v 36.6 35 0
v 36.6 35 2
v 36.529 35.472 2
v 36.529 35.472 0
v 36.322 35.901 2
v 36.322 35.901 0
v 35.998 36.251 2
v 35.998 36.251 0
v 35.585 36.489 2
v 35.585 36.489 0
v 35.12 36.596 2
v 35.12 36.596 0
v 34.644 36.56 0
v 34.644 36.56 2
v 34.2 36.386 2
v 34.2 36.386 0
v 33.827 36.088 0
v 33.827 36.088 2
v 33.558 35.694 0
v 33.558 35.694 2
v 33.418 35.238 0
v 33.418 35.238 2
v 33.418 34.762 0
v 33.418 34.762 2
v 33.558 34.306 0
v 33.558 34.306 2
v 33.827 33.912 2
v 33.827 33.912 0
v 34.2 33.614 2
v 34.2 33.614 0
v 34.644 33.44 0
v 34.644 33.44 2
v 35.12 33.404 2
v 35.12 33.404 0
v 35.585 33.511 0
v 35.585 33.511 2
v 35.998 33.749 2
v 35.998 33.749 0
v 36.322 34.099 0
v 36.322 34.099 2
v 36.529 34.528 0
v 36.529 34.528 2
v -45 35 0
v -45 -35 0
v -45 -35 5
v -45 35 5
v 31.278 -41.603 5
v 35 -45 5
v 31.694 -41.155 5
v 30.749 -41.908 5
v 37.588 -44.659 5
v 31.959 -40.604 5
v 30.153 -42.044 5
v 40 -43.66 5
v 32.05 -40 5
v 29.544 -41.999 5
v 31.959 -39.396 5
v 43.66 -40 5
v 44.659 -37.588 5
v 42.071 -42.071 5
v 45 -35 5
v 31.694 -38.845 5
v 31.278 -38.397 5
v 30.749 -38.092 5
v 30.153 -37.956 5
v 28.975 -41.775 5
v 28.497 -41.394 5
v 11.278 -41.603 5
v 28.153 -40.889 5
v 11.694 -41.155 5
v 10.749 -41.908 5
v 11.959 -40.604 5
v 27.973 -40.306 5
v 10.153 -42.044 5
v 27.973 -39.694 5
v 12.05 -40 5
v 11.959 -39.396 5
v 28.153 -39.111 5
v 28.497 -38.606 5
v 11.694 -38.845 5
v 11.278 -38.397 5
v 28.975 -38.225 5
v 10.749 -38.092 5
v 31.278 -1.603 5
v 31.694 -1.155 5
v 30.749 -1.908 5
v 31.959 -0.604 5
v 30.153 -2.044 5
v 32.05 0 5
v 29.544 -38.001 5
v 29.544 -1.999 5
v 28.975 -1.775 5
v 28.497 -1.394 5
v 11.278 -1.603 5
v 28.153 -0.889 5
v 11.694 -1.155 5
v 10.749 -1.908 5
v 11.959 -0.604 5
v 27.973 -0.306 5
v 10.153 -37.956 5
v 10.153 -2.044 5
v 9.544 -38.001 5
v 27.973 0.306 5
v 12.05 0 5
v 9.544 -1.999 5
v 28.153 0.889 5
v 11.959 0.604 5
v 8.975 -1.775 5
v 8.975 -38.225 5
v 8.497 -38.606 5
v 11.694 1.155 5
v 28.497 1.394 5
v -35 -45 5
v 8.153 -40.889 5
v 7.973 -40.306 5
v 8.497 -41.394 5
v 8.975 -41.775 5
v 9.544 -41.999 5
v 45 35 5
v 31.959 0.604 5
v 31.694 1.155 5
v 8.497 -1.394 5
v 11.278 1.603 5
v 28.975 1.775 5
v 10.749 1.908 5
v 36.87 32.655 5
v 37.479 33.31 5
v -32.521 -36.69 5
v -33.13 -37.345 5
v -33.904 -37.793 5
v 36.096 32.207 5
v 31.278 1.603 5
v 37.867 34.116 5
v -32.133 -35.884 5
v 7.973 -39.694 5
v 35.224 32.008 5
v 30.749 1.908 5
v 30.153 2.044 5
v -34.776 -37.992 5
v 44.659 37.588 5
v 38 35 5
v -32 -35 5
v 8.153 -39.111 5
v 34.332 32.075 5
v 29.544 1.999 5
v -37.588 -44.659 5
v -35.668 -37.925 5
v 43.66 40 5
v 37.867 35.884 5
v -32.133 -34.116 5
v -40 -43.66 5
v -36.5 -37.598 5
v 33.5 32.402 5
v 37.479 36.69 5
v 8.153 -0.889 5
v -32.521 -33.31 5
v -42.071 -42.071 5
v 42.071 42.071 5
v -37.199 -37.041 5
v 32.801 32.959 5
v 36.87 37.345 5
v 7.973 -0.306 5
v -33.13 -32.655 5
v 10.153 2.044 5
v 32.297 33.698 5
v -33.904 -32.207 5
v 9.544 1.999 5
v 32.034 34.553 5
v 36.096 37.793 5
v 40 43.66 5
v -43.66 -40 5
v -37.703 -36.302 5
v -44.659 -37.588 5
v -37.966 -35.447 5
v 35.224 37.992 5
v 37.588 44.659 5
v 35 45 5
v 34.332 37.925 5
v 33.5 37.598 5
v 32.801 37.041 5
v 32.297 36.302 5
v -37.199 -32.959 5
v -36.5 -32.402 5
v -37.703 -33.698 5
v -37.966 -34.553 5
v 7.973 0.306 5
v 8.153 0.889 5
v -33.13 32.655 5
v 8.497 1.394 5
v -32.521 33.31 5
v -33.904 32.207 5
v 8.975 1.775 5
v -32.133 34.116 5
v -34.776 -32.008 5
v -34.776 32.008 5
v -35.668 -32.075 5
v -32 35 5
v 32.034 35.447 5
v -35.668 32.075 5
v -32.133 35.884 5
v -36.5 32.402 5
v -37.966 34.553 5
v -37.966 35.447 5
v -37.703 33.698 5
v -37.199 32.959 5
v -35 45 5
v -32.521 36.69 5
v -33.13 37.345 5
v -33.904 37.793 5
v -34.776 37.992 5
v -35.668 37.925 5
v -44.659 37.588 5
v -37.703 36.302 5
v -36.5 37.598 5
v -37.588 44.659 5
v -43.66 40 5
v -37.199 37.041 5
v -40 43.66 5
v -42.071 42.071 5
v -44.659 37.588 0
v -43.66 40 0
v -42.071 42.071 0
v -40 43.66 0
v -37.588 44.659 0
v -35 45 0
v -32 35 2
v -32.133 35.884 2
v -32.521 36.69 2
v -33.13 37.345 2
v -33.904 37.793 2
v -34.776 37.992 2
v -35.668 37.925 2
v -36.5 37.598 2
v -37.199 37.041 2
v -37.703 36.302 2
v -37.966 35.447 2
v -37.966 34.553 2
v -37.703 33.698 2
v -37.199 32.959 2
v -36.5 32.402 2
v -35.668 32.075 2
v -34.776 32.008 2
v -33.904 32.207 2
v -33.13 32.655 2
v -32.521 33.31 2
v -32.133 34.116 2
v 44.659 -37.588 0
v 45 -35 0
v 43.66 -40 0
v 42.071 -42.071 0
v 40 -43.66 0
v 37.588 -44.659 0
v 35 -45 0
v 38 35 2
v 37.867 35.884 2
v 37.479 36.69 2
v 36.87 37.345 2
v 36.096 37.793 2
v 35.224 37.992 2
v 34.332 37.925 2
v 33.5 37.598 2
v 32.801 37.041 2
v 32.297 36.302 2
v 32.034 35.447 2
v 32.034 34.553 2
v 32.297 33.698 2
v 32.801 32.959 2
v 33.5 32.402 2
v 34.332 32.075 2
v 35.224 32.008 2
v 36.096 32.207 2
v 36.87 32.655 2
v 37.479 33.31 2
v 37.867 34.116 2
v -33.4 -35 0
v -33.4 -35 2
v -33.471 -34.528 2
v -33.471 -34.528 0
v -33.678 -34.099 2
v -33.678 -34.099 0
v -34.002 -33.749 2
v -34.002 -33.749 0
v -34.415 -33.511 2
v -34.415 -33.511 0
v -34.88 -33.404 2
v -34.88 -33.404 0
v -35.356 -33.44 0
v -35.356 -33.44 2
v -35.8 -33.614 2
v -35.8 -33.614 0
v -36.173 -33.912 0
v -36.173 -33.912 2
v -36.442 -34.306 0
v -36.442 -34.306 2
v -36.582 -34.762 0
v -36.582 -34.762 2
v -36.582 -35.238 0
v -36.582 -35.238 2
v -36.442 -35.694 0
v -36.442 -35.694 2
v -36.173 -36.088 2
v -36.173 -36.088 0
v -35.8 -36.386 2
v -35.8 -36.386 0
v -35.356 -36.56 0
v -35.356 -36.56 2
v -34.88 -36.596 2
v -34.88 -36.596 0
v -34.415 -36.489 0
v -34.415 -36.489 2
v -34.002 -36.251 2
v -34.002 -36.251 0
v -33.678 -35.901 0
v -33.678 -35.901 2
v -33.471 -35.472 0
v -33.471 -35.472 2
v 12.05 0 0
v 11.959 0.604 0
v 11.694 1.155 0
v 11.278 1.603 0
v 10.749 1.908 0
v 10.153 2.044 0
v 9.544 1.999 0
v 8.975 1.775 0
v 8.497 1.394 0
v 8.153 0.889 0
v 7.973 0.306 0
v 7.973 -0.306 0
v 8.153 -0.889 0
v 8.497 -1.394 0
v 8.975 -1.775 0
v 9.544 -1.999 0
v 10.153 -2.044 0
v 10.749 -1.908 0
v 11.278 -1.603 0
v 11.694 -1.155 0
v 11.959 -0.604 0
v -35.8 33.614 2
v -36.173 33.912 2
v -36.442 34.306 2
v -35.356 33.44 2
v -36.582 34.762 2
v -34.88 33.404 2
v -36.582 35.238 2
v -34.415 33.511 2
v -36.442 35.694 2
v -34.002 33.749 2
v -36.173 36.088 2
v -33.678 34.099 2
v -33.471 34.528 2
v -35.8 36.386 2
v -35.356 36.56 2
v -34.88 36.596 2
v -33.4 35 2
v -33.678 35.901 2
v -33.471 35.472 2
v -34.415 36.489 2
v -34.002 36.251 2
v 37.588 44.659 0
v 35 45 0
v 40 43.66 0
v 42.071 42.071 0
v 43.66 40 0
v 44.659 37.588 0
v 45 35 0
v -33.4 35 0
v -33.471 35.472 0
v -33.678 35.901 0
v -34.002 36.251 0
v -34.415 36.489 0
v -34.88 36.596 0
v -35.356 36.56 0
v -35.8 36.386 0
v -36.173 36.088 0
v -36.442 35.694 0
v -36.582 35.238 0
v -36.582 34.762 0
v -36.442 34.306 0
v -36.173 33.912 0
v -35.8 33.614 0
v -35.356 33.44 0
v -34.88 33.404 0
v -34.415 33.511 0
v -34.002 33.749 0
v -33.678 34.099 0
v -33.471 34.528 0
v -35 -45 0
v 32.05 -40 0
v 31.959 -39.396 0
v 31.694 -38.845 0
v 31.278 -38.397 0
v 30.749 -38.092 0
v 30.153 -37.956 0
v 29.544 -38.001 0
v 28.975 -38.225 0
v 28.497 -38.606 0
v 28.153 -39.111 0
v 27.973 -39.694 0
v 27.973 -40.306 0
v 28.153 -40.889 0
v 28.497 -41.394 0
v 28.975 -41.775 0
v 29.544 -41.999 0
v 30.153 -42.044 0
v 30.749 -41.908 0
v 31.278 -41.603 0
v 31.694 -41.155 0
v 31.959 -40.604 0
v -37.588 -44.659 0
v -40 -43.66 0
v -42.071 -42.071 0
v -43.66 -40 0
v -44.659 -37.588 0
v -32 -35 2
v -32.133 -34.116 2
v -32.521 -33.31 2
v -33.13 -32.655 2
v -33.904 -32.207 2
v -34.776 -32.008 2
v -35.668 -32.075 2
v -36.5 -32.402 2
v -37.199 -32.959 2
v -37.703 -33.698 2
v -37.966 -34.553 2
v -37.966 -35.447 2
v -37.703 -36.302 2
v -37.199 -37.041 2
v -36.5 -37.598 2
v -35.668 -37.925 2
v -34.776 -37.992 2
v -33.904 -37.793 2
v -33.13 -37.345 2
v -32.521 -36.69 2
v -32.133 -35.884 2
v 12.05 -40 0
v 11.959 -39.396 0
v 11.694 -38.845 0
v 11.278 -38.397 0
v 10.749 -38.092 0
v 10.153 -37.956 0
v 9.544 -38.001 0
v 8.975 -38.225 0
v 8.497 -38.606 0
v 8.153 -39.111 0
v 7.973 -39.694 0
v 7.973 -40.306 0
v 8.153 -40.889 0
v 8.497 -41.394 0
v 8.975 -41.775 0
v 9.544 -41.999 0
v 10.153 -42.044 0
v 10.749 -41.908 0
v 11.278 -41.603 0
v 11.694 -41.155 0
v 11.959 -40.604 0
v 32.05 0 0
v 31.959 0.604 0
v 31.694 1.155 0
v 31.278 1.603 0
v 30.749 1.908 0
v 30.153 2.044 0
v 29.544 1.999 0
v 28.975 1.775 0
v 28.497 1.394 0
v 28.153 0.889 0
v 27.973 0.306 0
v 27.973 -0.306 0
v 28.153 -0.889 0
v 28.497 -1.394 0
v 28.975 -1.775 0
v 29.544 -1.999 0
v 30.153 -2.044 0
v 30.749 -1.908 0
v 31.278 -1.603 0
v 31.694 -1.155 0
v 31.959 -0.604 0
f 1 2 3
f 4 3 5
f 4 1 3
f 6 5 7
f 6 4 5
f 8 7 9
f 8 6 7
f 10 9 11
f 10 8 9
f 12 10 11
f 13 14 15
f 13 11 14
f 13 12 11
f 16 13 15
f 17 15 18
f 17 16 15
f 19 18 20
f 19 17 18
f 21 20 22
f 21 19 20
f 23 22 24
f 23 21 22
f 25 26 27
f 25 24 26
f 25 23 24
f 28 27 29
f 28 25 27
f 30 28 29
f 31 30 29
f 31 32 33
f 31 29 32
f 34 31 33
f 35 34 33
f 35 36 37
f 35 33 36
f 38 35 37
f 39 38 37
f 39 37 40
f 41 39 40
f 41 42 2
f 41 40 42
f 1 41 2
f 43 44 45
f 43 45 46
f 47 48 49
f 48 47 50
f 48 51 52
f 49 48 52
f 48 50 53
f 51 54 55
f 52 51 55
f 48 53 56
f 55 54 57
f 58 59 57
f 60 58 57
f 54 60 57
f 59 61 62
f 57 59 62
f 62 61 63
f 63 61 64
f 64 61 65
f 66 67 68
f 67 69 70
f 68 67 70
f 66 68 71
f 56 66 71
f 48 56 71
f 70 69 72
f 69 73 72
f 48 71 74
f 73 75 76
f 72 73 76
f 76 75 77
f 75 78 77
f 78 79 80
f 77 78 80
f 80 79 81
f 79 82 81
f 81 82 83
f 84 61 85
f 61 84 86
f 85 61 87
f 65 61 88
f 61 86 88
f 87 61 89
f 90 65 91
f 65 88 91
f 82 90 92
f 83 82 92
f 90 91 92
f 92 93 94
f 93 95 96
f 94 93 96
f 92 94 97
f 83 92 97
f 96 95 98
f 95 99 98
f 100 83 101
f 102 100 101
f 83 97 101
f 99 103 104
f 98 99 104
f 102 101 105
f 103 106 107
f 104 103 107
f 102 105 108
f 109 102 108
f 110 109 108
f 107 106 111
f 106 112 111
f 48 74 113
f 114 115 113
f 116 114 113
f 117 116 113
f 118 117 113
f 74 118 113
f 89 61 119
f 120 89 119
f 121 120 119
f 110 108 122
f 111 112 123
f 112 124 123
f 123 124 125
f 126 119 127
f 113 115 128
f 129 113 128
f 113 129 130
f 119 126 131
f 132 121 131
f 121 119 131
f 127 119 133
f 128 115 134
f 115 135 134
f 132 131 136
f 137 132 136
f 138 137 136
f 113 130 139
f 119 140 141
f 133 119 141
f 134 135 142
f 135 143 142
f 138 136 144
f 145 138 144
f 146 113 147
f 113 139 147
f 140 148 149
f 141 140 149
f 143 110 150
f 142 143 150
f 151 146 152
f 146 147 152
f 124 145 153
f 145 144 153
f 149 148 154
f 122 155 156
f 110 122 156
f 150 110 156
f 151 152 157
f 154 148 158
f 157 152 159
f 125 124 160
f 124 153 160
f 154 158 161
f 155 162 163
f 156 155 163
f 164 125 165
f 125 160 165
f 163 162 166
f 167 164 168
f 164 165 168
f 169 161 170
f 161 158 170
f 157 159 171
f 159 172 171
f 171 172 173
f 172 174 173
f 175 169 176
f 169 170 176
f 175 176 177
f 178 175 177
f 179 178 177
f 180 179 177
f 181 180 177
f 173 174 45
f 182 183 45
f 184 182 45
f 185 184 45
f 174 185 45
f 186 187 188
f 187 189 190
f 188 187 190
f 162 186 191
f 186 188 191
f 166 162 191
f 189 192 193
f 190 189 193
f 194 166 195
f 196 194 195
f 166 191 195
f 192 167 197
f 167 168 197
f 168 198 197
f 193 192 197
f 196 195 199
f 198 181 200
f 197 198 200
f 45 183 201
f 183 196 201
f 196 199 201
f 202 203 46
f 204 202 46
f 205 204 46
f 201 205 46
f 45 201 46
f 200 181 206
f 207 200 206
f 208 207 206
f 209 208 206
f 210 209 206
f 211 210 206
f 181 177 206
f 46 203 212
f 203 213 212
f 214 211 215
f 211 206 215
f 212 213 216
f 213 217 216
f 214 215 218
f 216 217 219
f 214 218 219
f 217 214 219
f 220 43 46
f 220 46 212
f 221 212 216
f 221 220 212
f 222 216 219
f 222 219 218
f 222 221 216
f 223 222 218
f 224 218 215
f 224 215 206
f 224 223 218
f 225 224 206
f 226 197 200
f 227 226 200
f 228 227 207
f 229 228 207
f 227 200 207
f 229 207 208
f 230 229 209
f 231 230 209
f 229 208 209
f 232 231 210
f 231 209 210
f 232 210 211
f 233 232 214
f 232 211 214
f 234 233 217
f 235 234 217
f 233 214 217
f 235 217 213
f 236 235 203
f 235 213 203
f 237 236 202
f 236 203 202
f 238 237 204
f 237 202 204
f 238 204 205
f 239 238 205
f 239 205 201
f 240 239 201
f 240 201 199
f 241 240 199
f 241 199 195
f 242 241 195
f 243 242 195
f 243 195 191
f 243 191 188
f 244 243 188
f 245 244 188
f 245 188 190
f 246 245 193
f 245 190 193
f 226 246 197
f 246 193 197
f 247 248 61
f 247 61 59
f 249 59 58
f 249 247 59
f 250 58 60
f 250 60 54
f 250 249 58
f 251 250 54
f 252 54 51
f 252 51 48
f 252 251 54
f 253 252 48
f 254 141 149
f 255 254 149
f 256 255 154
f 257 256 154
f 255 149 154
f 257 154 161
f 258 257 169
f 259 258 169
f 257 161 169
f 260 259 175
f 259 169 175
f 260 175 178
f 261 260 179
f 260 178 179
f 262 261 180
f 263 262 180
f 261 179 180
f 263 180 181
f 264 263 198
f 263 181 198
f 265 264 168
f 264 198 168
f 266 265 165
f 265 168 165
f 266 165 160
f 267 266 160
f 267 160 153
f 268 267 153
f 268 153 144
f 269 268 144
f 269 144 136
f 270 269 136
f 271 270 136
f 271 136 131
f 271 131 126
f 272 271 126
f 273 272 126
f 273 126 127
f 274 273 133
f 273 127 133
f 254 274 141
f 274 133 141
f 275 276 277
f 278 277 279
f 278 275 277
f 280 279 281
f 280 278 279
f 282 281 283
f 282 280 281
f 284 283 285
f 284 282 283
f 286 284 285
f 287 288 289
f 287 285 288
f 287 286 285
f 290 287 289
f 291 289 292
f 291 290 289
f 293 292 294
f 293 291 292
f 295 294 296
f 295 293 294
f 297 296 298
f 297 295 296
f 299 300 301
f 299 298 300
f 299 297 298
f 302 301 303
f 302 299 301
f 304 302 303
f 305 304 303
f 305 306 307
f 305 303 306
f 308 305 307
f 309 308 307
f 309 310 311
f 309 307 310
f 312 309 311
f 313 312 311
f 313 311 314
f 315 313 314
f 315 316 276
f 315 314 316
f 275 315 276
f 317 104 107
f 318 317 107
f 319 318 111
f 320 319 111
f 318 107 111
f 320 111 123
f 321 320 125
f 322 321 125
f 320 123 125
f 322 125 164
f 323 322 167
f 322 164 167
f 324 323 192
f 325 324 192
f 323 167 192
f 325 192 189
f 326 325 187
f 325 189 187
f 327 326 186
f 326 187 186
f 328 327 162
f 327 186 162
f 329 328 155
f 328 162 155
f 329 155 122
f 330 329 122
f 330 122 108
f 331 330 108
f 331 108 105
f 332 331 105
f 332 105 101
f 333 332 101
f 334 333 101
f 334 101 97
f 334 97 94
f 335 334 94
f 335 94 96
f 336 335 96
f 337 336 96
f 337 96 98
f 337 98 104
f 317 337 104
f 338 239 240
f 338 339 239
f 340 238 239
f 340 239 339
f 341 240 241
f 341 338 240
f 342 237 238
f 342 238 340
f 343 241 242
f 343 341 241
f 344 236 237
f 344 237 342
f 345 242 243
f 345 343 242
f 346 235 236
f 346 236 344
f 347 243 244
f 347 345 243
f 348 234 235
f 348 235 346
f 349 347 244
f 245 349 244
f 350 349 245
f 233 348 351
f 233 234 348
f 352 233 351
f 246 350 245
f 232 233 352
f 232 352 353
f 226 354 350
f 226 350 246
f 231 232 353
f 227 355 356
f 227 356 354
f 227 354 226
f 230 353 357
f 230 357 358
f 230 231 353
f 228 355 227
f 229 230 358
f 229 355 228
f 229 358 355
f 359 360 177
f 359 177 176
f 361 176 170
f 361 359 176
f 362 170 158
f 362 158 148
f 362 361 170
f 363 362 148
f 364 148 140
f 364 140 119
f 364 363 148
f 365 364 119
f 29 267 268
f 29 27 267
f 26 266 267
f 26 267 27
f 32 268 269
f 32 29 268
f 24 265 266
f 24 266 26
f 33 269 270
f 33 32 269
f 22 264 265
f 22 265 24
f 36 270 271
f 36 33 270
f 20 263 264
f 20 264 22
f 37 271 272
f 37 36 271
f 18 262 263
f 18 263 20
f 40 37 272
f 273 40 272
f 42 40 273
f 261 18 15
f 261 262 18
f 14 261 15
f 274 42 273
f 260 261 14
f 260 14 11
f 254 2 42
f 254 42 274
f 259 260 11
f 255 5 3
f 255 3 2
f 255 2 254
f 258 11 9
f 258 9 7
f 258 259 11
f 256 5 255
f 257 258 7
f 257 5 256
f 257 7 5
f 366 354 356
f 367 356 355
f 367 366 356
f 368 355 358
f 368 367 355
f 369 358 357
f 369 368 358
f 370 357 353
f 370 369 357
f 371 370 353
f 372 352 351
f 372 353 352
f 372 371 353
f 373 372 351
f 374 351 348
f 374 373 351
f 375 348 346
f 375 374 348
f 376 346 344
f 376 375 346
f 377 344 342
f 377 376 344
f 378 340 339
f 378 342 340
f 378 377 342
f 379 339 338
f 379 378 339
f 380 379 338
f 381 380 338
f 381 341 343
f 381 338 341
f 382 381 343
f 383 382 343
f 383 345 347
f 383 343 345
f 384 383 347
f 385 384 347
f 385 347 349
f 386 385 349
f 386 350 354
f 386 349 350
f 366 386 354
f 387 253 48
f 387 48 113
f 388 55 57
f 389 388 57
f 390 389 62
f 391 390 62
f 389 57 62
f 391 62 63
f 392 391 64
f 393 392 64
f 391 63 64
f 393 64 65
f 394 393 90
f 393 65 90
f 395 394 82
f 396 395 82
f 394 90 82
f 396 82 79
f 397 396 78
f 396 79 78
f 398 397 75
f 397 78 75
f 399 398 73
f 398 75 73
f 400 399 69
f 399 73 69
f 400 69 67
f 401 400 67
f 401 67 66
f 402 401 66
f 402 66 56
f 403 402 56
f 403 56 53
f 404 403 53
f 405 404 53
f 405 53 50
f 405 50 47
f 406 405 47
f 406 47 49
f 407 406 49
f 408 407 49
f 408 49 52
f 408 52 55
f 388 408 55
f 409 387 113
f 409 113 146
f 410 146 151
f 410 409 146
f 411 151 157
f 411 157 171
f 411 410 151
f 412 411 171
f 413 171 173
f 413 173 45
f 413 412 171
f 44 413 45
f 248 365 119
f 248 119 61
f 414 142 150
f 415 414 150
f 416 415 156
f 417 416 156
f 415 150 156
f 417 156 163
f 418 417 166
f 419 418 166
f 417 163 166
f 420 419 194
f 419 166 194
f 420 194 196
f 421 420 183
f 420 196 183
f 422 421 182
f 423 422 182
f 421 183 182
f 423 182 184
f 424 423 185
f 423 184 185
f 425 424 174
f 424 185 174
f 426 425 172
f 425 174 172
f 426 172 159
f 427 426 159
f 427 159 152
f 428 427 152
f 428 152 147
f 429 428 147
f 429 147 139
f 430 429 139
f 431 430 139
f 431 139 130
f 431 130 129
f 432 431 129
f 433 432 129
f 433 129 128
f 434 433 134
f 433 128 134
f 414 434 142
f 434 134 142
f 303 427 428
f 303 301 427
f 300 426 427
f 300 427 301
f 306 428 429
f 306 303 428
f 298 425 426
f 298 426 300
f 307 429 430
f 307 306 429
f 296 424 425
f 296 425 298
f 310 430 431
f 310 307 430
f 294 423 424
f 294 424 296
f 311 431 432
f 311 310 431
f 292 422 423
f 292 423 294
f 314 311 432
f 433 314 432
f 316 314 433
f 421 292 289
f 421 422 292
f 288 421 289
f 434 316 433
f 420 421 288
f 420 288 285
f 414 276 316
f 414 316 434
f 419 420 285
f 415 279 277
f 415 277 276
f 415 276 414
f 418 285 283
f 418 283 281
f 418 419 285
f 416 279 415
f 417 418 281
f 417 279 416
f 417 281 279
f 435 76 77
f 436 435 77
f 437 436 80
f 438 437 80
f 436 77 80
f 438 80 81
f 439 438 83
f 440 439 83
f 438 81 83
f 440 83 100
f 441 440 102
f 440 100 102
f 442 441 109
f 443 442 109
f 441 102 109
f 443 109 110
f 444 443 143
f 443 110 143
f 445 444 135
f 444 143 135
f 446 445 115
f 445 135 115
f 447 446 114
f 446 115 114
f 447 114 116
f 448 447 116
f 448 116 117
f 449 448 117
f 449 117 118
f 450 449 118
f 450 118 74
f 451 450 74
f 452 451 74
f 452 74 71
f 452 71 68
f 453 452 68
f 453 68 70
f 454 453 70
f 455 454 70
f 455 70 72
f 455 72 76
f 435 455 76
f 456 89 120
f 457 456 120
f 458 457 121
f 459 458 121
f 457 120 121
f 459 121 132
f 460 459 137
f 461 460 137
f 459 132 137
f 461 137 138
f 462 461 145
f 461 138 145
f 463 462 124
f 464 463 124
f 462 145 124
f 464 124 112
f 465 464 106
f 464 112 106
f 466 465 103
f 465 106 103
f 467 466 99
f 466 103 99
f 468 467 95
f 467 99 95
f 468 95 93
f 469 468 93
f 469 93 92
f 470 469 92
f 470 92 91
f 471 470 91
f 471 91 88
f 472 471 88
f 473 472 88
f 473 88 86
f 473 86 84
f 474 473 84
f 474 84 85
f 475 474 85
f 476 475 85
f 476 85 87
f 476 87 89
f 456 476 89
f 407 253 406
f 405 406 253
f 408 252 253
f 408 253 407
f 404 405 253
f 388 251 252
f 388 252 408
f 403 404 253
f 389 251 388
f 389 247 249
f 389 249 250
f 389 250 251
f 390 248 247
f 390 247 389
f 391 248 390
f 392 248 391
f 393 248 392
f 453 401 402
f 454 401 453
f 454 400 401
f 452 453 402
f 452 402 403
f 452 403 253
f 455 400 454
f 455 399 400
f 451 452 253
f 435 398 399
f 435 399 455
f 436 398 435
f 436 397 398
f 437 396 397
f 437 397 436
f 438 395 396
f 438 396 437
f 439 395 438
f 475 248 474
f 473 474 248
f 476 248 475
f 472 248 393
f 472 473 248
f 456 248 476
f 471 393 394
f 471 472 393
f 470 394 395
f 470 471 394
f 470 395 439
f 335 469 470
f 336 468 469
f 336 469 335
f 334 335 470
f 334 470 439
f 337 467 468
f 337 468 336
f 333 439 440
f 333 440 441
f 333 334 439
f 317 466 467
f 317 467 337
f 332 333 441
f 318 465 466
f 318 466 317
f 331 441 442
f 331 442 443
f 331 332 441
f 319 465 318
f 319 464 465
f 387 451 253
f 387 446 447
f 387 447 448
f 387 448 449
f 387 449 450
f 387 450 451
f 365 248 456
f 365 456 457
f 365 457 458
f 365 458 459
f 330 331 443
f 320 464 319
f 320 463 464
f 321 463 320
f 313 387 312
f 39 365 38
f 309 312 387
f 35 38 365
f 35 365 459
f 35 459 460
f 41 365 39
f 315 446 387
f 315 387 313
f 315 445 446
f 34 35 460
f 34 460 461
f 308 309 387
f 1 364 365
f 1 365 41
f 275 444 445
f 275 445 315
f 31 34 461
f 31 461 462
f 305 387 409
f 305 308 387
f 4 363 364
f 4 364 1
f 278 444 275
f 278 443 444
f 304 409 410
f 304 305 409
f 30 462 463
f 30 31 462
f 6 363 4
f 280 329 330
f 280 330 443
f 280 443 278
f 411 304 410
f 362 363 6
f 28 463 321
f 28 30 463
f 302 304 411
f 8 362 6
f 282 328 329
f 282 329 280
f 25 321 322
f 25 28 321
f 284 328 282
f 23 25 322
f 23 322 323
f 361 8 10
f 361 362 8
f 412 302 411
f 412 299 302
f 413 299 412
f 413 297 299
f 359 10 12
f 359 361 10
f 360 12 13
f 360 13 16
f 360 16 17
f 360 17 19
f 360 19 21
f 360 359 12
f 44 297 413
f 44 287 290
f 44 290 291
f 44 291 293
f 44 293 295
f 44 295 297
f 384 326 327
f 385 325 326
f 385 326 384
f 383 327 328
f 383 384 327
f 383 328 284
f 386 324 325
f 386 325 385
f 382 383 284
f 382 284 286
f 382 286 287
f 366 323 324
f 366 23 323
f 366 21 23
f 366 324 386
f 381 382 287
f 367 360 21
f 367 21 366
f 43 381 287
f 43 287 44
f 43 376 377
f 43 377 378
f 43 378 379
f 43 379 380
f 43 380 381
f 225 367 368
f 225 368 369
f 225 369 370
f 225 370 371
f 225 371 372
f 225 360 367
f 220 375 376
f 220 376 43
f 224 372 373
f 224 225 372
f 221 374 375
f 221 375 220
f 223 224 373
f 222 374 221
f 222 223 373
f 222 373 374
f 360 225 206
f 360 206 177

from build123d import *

# Parameters (mm, degrees)
SKETCH_1_R          = 1.6
EXTRUDE_1_DEPTH     = 5
SKETCH_2_R          = 3
CUT_EXTRUDE_1_DEPTH = 3
SKETCH_3_R          = 2.05
CUT_EXTRUDE_2_DEPTH = 64.835726674


with BuildPart() as part:
    # ｽｹｯﾁ1 → ﾎﾞｽ - 押し出し1 (new body)
    with BuildSketch(Plane.XY):
        with BuildLine():
            Line((-35, 45), (35, 45))
            ThreePointArc((35, 45), (42.071067812, 42.071067812), (45, 35))
            Line((45, 35), (45, -35))
            ThreePointArc((45, -35), (42.071067812, -42.071067812), (35, -45))
            Line((35, -45), (-35, -45))
            ThreePointArc((-35, -45), (-42.071067812, -42.071067812), (-45, -35))
            Line((-45, -35), (-45, 35))
            ThreePointArc((-45, 35), (-42.071067812, 42.071067812), (-35, 45))
        make_face()
        with Locations((-35, -35)):
            Circle(SKETCH_1_R, mode=Mode.SUBTRACT)
        with Locations((-35, 35)):
            Circle(SKETCH_1_R, mode=Mode.SUBTRACT)
        with Locations((35, 35)):
            Circle(SKETCH_1_R, mode=Mode.SUBTRACT)
    extrude(amount=EXTRUDE_1_DEPTH)

    # ｽｹｯﾁ2 → ｶｯﾄ - 押し出し1 (cut)
    with BuildSketch(Plane.XY.offset(5)):
        with Locations((-35, 35)):
            Circle(SKETCH_2_R)
        with Locations((35, 35)):
            Circle(SKETCH_2_R)
        with Locations((-35, -35)):
            Circle(SKETCH_2_R)
    extrude(amount=-CUT_EXTRUDE_1_DEPTH, mode=Mode.SUBTRACT)

    # ｽｹｯﾁ3 → ｶｯﾄ - 押し出し2 (cut, through all)
    with BuildSketch(Plane.XY.offset(5)):
        with Locations((30, 0)):
            Circle(SKETCH_3_R)
        with Locations((10, 0)):
            Circle(SKETCH_3_R)
        with Locations((10, -40)):
            Circle(SKETCH_3_R)
        with Locations((30, -40)):
            Circle(SKETCH_3_R)
    extrude(amount=-CUT_EXTRUDE_2_DEPTH, mode=Mode.SUBTRACT)


solid = part.part
